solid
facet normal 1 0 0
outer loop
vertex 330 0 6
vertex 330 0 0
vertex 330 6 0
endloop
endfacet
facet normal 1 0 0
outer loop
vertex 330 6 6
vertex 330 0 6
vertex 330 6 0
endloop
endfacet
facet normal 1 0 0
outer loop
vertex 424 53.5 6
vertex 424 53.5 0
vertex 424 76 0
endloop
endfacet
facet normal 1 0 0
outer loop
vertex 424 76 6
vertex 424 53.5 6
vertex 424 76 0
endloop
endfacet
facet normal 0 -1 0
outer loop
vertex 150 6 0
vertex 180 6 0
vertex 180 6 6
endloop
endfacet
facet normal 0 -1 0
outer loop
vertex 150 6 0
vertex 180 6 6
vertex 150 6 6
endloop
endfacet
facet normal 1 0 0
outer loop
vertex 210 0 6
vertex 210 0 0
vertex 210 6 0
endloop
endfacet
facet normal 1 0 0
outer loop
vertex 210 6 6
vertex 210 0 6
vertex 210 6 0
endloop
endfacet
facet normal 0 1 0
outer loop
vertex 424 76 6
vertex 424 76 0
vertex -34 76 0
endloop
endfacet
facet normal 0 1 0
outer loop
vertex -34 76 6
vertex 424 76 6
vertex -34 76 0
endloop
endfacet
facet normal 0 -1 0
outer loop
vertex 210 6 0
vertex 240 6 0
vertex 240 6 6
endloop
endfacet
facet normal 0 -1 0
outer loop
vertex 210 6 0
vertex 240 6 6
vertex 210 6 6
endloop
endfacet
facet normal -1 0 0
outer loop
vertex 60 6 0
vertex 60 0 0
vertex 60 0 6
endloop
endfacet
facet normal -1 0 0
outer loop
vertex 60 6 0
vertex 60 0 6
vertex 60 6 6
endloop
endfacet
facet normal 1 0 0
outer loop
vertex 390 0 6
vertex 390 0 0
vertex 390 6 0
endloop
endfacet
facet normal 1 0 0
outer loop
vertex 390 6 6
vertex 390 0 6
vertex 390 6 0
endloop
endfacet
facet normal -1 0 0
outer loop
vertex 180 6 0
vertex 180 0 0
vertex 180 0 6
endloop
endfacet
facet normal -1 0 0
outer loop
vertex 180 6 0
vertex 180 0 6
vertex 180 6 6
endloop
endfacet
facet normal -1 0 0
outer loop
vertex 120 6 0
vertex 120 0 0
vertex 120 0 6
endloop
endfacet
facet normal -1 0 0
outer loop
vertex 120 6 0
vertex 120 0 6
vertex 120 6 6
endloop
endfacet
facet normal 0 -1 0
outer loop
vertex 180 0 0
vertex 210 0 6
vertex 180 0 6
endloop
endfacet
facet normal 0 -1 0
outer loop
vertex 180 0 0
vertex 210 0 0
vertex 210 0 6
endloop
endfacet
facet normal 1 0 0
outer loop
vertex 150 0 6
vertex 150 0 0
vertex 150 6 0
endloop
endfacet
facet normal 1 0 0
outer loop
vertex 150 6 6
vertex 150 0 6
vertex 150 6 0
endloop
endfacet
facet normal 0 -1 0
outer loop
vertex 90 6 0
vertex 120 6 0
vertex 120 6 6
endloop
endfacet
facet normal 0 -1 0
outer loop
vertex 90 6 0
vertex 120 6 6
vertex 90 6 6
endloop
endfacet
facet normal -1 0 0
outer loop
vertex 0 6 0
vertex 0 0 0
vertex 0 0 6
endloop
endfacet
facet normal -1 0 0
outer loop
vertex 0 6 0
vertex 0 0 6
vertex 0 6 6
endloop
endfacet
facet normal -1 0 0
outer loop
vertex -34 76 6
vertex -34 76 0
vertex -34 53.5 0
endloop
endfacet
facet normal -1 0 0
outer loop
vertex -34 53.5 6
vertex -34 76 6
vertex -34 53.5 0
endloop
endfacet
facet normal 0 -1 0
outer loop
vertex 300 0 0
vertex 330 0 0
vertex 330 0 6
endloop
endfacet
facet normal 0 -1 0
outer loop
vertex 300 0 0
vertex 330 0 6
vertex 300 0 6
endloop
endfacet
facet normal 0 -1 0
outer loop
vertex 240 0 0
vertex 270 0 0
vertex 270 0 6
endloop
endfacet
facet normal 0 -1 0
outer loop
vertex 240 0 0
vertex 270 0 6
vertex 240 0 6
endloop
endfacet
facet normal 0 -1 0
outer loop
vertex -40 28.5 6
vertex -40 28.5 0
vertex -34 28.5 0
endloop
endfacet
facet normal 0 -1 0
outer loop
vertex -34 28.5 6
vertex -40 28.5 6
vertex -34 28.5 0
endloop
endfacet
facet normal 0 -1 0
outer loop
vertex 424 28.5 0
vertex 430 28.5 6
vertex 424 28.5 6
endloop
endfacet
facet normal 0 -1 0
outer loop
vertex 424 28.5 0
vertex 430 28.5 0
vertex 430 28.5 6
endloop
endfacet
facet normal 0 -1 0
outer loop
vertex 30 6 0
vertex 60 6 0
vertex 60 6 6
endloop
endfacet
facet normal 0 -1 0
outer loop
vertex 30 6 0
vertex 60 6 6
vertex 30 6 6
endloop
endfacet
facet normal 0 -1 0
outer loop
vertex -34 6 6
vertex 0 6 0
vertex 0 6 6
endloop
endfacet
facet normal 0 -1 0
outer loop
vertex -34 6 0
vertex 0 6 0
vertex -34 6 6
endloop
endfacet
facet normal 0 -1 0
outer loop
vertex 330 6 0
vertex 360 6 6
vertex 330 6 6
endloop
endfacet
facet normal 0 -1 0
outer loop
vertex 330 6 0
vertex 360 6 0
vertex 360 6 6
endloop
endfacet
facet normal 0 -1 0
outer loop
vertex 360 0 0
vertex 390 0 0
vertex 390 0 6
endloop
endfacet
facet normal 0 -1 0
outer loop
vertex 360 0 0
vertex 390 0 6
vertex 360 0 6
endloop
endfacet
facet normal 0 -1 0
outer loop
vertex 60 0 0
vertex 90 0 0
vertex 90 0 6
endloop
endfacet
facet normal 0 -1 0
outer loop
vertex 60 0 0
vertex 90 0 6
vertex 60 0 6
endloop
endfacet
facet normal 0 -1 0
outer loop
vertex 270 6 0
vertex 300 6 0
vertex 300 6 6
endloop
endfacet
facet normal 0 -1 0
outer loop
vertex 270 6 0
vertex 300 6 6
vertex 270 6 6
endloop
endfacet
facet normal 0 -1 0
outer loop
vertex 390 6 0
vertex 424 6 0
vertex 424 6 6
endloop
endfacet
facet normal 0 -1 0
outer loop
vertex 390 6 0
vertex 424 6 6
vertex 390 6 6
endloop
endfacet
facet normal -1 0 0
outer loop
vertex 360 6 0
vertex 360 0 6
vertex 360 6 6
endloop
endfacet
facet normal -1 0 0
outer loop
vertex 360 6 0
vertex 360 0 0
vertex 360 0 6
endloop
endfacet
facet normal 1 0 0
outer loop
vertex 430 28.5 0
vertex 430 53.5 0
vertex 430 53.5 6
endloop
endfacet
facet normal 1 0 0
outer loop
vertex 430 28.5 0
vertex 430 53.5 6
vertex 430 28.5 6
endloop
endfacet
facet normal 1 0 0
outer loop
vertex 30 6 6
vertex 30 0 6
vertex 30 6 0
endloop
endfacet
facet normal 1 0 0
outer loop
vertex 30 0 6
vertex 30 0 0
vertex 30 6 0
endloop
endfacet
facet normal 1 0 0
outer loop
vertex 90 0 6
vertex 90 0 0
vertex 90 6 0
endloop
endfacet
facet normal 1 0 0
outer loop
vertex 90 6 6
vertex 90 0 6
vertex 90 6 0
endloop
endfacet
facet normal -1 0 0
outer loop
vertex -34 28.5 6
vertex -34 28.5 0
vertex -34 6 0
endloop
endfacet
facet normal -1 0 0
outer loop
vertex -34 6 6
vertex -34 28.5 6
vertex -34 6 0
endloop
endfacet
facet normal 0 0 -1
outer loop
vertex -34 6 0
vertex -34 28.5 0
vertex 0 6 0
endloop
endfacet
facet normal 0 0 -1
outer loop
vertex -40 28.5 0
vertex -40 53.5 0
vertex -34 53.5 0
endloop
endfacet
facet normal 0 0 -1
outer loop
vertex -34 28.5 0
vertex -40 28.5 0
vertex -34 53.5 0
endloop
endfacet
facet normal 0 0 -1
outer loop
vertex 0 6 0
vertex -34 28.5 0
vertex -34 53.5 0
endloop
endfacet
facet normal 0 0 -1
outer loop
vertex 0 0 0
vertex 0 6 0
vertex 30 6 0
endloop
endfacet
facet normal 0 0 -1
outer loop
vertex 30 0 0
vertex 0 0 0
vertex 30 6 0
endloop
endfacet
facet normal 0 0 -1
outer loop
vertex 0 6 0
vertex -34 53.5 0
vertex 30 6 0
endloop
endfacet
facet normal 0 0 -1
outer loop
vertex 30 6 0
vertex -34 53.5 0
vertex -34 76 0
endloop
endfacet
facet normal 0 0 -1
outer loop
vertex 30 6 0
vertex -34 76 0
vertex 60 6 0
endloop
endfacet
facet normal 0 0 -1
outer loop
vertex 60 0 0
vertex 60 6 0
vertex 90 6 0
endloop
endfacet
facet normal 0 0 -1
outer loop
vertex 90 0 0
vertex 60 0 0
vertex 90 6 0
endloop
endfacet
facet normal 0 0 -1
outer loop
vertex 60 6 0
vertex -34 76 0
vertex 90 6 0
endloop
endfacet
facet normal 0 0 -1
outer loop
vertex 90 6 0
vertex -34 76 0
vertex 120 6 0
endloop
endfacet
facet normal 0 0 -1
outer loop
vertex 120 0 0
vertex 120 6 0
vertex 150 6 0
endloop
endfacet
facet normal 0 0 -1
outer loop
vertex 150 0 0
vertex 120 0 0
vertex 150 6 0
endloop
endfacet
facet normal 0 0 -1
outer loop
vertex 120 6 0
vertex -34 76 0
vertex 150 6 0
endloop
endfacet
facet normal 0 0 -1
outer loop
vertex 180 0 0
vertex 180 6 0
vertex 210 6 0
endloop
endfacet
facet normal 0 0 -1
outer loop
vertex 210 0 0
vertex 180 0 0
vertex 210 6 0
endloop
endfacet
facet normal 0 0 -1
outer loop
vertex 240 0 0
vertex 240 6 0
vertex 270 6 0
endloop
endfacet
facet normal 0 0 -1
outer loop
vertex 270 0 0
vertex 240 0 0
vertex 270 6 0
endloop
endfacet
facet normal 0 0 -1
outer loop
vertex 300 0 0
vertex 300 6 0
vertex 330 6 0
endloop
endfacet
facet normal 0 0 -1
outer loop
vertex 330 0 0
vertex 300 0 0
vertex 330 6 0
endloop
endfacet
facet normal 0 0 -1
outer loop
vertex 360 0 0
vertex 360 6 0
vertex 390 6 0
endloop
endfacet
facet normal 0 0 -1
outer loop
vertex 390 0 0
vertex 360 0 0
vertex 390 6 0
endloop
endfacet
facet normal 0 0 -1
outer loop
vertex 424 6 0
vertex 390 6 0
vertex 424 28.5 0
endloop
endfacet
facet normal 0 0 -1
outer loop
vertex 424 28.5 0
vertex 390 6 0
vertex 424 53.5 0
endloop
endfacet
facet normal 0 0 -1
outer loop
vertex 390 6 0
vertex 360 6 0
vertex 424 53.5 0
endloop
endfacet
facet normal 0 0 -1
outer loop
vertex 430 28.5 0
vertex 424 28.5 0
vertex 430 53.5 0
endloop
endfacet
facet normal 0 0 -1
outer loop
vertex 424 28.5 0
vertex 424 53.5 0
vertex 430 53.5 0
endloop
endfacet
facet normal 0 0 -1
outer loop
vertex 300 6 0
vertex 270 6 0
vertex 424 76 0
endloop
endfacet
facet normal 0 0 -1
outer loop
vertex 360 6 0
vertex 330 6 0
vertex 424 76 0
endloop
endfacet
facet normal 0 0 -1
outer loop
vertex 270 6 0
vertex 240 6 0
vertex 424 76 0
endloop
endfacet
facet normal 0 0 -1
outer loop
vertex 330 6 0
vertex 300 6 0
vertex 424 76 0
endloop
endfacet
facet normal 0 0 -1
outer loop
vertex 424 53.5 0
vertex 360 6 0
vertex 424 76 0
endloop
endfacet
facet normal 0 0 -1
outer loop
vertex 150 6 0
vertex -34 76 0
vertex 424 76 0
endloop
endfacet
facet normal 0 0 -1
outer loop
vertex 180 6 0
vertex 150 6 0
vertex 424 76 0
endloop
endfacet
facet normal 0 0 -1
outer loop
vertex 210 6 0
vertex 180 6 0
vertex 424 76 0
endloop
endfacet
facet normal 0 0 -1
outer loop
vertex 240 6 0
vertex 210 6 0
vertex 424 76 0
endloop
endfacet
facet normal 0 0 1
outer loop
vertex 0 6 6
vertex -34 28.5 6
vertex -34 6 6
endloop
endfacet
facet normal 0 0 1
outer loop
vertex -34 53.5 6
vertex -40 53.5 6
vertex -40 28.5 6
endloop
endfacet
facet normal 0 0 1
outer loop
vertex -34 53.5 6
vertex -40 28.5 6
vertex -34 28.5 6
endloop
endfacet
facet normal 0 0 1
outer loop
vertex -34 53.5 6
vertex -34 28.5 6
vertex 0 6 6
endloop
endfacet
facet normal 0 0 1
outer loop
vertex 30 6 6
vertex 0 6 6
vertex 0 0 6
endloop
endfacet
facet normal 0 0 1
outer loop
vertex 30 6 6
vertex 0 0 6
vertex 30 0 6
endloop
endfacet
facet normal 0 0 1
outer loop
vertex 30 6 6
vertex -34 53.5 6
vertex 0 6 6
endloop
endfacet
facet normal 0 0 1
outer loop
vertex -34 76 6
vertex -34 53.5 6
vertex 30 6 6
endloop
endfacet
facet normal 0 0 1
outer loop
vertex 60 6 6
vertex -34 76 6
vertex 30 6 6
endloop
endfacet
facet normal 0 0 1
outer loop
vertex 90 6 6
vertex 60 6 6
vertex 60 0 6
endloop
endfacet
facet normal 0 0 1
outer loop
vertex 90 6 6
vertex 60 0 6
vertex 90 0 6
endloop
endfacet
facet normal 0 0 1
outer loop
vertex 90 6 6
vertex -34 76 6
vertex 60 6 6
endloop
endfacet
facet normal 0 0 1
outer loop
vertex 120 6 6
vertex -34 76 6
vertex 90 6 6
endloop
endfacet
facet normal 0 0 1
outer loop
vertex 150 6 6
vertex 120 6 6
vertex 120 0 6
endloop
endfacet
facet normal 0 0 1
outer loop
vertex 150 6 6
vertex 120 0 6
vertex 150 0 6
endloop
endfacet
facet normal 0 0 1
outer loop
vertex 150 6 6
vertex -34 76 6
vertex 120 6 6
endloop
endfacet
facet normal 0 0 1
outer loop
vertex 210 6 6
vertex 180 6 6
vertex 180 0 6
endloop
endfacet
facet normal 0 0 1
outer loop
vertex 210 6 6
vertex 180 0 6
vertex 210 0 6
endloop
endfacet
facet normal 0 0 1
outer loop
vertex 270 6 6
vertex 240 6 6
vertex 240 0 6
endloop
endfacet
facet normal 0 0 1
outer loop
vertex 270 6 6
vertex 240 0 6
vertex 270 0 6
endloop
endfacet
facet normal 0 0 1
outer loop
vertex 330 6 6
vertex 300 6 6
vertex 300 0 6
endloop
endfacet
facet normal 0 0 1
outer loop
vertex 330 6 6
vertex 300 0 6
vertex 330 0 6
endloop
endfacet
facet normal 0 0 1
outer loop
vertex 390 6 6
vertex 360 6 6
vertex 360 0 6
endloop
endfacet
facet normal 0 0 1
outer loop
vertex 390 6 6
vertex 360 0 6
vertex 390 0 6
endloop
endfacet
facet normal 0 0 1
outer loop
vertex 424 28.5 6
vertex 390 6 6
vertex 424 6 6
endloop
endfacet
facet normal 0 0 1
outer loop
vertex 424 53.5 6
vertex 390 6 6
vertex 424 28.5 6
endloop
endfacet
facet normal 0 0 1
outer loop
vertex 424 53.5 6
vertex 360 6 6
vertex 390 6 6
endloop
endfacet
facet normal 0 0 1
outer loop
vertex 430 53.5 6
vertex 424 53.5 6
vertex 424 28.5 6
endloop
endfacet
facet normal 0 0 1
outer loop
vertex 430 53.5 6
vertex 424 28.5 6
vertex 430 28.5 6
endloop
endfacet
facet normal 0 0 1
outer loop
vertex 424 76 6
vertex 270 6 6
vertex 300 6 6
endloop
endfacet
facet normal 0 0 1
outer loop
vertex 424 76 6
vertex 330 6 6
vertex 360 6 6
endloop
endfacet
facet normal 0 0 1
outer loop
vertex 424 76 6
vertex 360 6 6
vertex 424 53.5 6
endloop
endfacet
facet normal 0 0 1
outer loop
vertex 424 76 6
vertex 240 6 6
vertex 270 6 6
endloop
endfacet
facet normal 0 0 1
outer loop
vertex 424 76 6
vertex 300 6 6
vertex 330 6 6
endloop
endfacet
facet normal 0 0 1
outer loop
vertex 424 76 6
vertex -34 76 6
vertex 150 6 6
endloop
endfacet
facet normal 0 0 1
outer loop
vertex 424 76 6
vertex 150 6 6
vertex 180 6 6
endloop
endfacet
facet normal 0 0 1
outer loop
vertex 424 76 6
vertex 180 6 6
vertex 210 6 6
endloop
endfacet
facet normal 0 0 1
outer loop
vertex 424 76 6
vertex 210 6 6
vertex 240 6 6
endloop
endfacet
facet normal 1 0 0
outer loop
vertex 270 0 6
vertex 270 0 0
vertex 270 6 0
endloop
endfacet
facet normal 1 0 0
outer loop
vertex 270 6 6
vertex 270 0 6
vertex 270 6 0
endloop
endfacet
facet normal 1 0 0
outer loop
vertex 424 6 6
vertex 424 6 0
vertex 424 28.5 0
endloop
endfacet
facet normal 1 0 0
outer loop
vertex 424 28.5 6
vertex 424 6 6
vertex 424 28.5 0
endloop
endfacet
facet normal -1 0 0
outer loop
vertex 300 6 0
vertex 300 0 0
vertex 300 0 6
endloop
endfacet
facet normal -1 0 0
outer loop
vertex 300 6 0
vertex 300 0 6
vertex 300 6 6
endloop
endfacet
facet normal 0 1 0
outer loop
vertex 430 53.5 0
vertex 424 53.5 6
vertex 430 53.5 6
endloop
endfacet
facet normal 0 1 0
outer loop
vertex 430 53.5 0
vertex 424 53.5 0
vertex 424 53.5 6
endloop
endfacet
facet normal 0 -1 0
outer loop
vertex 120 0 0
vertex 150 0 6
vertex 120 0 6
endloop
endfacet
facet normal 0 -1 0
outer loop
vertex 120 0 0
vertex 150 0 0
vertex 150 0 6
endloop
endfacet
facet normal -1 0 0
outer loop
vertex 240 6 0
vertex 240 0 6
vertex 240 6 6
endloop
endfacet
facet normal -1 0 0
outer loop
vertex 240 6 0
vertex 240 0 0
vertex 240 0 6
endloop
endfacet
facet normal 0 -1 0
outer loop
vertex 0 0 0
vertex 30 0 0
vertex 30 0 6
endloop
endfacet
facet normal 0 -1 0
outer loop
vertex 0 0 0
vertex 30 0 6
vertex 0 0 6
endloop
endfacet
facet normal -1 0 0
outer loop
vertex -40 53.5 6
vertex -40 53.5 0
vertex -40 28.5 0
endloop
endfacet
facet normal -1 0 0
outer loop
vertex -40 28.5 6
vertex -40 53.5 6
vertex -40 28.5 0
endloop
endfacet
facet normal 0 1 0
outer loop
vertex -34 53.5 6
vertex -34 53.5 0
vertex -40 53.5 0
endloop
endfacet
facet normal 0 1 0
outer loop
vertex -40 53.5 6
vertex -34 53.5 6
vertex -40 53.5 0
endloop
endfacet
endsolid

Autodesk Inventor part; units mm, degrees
ref_plane "YZ Plane" through (0, 0, 0) normal (1, 0, 0) x (0, 1, 0)
ref_plane "XZ Plane" through (0, 0, 0) normal (0, 1, 0) x (-1, 0, 0)
ref_plane "XY Plane" through (0, 0, 0) normal (0, 0, 1) x (1, 0, 0)
ref_plane "Work Plane1" through (0, 0, 0) normal (0, 0, 1) x (1, 0, 0)
sketch "Sketch1" plane through (0, 0, 0) normal (0, 0, 1) x (1, 0, 0)
  line L0 (-34, 6) -> (-34, 0)
  line L1 (-34, 0) -> (0, 0)
  line L2 (0, 0) -> (0, 6)
  line L3 (0, 6) -> (-34, 6)
  line L4 (0, 6) -> (30, 6)
  line L5 (0, 0) -> (0, 6)
  line L6 (30, 0) -> (0, 0)
  line L7 (30, 0) -> (30, 6)
  line L8 (30, 6) -> (30, 0)
  line L9 (30, 0) -> (60, 0)
  line L10 (60, 0) -> (60, 6)
  line L11 (60, 6) -> (30, 6)
  line L12 (60, 6) -> (90, 6)
  line L13 (60, 0) -> (60, 6)
  line L14 (90, 0) -> (60, 0)
  line L15 (90, 0) -> (90, 6)
  line L16 (90, 6) -> (90, 0)
  line L17 (90, 0) -> (120, 0)
  line L18 (120, 0) -> (120, 6)
  line L19 (120, 6) -> (90, 6)
  line L20 (120, 6) -> (150, 6)
  line L21 (120, 0) -> (120, 6)
  line L22 (150, 0) -> (120, 0)
  line L23 (150, 0) -> (150, 6)
  line L24 (150, 6) -> (150, 0)
  line L25 (150, 0) -> (180, 0)
  line L26 (180, 0) -> (180, 6)
  line L27 (180, 6) -> (150, 6)
  line L28 (180, 6) -> (210, 6)
  line L29 (180, 6) -> (210, 6)
  line L30 (180, 0) -> (180, 6)
  line L31 (210, 0) -> (180, 0)
  line L32 (210, 0) -> (210, 6)
  line L33 (240, 0) -> (240, 6)
  line L34 (240, 6) -> (210, 6)
  line L35 (210, 6) -> (210, 0)
  line L36 (210, 0) -> (240, 0)
  line L37 (240, 6) -> (270, 6)
  line L38 (240, 0) -> (240, 6)
  line L39 (270, 0) -> (240, 0)
  line L40 (270, 0) -> (270, 6)
  line L41 (300, 0) -> (300, 6)
  line L42 (300, 6) -> (270, 6)
  line L43 (270, 6) -> (270, 0)
  line L44 (270, 0) -> (300, 0)
  line L45 (300, 6) -> (330, 6)
  line L46 (300, 0) -> (300, 6)
  line L47 (330, 0) -> (300, 0)
  line L48 (330, 0) -> (330, 6)
  line L49 (360, 0) -> (360, 6)
  line L50 (360, 6) -> (330, 6)
  line L51 (330, 6) -> (330, 0)
  line L52 (330, 0) -> (360, 0)
  line L53 (360, 6) -> (390, 6)
  line L54 (360, 0) -> (360, 6)
  line L55 (390, 0) -> (360, 0)
  line L56 (390, 0) -> (390, 6)
  line L57 (424, 0) -> (424, 6)
  line L58 (424, 6) -> (390, 6)
  line L59 (390, 6) -> (390, 0)
  line L60 (390, 0) -> (424, 0)
  line L61 (-34, 6) -> (424, 6)
  line L62 (424, 6) -> (424, 76)
  line L63 (424, 76) -> (-34, 76)
  line L64 (-34, 76) -> (-34, 6)
  line L65 (401, 57.7) -> (300, 57.7)
  line L66 (-34, 53.5) -> (-40, 53.5)
  line L67 (-40, 53.5) -> (-40, 28.5)
  line L68 (-40, 28.5) -> (-34, 28.5)
  line L69 (-34, 28.5) -> (-34, 53.5)
  line L70 (424, 53.5) -> (430, 53.5)
  line L71 (430, 53.5) -> (430, 28.5)
  line L72 (430, 28.5) -> (424, 28.5)
  line L73 (424, 28.5) -> (424, 53.5)
  point P0 (430, 41)
  point P1 (424, 41)
  point P2 (-40, 41)
  point P3 (-34, 41)
  point P4 (-34, 41)
  dimension "d0" = 70
  dimension "d2" = 6
  dimension "d3" = 6
  dimension "d4" = 25
extrude "Plate1" add sketch "Sketch1" along normal blind 6 contours L64 L63 L62 L58 L53 L50 L45 L42 L37 L34 L28 L27 L20 L19 L12 L11 L4 L3 | L4 L7 L6 L2 | L68 L67 L66 L64 | L12 L15 L14 L10 | L20 L23 L22 L18 | L70 L71 L72 L62 | L28 L32 L31 L26 | L56 L55 L49 L53 | L37 L40 L39 L33 | L48 L47 L41 L45
equation "\"d1\" = Thickness"
equation "\"BendRadius\" = Thickness"
equation "\"BendReliefWidth\" = Thickness"
equation "\"BendReliefDepth\" = 0.5 * Thickness"
equation "\"CornerReliefSize\" = 4 * Thickness"
equation "\"MinimumRemnant\" = 2 * Thickness"
equation "\"TransitionRadius\" = BendRadius"
equation "\"JacobiRadiusSize\" = BendRadius"
equation "\"GapSize\" = Thickness"
equation "\"Thickness\" = 6"
properties part number "voorzijde boven elektrobox v2" material "Wood (Birch)"
